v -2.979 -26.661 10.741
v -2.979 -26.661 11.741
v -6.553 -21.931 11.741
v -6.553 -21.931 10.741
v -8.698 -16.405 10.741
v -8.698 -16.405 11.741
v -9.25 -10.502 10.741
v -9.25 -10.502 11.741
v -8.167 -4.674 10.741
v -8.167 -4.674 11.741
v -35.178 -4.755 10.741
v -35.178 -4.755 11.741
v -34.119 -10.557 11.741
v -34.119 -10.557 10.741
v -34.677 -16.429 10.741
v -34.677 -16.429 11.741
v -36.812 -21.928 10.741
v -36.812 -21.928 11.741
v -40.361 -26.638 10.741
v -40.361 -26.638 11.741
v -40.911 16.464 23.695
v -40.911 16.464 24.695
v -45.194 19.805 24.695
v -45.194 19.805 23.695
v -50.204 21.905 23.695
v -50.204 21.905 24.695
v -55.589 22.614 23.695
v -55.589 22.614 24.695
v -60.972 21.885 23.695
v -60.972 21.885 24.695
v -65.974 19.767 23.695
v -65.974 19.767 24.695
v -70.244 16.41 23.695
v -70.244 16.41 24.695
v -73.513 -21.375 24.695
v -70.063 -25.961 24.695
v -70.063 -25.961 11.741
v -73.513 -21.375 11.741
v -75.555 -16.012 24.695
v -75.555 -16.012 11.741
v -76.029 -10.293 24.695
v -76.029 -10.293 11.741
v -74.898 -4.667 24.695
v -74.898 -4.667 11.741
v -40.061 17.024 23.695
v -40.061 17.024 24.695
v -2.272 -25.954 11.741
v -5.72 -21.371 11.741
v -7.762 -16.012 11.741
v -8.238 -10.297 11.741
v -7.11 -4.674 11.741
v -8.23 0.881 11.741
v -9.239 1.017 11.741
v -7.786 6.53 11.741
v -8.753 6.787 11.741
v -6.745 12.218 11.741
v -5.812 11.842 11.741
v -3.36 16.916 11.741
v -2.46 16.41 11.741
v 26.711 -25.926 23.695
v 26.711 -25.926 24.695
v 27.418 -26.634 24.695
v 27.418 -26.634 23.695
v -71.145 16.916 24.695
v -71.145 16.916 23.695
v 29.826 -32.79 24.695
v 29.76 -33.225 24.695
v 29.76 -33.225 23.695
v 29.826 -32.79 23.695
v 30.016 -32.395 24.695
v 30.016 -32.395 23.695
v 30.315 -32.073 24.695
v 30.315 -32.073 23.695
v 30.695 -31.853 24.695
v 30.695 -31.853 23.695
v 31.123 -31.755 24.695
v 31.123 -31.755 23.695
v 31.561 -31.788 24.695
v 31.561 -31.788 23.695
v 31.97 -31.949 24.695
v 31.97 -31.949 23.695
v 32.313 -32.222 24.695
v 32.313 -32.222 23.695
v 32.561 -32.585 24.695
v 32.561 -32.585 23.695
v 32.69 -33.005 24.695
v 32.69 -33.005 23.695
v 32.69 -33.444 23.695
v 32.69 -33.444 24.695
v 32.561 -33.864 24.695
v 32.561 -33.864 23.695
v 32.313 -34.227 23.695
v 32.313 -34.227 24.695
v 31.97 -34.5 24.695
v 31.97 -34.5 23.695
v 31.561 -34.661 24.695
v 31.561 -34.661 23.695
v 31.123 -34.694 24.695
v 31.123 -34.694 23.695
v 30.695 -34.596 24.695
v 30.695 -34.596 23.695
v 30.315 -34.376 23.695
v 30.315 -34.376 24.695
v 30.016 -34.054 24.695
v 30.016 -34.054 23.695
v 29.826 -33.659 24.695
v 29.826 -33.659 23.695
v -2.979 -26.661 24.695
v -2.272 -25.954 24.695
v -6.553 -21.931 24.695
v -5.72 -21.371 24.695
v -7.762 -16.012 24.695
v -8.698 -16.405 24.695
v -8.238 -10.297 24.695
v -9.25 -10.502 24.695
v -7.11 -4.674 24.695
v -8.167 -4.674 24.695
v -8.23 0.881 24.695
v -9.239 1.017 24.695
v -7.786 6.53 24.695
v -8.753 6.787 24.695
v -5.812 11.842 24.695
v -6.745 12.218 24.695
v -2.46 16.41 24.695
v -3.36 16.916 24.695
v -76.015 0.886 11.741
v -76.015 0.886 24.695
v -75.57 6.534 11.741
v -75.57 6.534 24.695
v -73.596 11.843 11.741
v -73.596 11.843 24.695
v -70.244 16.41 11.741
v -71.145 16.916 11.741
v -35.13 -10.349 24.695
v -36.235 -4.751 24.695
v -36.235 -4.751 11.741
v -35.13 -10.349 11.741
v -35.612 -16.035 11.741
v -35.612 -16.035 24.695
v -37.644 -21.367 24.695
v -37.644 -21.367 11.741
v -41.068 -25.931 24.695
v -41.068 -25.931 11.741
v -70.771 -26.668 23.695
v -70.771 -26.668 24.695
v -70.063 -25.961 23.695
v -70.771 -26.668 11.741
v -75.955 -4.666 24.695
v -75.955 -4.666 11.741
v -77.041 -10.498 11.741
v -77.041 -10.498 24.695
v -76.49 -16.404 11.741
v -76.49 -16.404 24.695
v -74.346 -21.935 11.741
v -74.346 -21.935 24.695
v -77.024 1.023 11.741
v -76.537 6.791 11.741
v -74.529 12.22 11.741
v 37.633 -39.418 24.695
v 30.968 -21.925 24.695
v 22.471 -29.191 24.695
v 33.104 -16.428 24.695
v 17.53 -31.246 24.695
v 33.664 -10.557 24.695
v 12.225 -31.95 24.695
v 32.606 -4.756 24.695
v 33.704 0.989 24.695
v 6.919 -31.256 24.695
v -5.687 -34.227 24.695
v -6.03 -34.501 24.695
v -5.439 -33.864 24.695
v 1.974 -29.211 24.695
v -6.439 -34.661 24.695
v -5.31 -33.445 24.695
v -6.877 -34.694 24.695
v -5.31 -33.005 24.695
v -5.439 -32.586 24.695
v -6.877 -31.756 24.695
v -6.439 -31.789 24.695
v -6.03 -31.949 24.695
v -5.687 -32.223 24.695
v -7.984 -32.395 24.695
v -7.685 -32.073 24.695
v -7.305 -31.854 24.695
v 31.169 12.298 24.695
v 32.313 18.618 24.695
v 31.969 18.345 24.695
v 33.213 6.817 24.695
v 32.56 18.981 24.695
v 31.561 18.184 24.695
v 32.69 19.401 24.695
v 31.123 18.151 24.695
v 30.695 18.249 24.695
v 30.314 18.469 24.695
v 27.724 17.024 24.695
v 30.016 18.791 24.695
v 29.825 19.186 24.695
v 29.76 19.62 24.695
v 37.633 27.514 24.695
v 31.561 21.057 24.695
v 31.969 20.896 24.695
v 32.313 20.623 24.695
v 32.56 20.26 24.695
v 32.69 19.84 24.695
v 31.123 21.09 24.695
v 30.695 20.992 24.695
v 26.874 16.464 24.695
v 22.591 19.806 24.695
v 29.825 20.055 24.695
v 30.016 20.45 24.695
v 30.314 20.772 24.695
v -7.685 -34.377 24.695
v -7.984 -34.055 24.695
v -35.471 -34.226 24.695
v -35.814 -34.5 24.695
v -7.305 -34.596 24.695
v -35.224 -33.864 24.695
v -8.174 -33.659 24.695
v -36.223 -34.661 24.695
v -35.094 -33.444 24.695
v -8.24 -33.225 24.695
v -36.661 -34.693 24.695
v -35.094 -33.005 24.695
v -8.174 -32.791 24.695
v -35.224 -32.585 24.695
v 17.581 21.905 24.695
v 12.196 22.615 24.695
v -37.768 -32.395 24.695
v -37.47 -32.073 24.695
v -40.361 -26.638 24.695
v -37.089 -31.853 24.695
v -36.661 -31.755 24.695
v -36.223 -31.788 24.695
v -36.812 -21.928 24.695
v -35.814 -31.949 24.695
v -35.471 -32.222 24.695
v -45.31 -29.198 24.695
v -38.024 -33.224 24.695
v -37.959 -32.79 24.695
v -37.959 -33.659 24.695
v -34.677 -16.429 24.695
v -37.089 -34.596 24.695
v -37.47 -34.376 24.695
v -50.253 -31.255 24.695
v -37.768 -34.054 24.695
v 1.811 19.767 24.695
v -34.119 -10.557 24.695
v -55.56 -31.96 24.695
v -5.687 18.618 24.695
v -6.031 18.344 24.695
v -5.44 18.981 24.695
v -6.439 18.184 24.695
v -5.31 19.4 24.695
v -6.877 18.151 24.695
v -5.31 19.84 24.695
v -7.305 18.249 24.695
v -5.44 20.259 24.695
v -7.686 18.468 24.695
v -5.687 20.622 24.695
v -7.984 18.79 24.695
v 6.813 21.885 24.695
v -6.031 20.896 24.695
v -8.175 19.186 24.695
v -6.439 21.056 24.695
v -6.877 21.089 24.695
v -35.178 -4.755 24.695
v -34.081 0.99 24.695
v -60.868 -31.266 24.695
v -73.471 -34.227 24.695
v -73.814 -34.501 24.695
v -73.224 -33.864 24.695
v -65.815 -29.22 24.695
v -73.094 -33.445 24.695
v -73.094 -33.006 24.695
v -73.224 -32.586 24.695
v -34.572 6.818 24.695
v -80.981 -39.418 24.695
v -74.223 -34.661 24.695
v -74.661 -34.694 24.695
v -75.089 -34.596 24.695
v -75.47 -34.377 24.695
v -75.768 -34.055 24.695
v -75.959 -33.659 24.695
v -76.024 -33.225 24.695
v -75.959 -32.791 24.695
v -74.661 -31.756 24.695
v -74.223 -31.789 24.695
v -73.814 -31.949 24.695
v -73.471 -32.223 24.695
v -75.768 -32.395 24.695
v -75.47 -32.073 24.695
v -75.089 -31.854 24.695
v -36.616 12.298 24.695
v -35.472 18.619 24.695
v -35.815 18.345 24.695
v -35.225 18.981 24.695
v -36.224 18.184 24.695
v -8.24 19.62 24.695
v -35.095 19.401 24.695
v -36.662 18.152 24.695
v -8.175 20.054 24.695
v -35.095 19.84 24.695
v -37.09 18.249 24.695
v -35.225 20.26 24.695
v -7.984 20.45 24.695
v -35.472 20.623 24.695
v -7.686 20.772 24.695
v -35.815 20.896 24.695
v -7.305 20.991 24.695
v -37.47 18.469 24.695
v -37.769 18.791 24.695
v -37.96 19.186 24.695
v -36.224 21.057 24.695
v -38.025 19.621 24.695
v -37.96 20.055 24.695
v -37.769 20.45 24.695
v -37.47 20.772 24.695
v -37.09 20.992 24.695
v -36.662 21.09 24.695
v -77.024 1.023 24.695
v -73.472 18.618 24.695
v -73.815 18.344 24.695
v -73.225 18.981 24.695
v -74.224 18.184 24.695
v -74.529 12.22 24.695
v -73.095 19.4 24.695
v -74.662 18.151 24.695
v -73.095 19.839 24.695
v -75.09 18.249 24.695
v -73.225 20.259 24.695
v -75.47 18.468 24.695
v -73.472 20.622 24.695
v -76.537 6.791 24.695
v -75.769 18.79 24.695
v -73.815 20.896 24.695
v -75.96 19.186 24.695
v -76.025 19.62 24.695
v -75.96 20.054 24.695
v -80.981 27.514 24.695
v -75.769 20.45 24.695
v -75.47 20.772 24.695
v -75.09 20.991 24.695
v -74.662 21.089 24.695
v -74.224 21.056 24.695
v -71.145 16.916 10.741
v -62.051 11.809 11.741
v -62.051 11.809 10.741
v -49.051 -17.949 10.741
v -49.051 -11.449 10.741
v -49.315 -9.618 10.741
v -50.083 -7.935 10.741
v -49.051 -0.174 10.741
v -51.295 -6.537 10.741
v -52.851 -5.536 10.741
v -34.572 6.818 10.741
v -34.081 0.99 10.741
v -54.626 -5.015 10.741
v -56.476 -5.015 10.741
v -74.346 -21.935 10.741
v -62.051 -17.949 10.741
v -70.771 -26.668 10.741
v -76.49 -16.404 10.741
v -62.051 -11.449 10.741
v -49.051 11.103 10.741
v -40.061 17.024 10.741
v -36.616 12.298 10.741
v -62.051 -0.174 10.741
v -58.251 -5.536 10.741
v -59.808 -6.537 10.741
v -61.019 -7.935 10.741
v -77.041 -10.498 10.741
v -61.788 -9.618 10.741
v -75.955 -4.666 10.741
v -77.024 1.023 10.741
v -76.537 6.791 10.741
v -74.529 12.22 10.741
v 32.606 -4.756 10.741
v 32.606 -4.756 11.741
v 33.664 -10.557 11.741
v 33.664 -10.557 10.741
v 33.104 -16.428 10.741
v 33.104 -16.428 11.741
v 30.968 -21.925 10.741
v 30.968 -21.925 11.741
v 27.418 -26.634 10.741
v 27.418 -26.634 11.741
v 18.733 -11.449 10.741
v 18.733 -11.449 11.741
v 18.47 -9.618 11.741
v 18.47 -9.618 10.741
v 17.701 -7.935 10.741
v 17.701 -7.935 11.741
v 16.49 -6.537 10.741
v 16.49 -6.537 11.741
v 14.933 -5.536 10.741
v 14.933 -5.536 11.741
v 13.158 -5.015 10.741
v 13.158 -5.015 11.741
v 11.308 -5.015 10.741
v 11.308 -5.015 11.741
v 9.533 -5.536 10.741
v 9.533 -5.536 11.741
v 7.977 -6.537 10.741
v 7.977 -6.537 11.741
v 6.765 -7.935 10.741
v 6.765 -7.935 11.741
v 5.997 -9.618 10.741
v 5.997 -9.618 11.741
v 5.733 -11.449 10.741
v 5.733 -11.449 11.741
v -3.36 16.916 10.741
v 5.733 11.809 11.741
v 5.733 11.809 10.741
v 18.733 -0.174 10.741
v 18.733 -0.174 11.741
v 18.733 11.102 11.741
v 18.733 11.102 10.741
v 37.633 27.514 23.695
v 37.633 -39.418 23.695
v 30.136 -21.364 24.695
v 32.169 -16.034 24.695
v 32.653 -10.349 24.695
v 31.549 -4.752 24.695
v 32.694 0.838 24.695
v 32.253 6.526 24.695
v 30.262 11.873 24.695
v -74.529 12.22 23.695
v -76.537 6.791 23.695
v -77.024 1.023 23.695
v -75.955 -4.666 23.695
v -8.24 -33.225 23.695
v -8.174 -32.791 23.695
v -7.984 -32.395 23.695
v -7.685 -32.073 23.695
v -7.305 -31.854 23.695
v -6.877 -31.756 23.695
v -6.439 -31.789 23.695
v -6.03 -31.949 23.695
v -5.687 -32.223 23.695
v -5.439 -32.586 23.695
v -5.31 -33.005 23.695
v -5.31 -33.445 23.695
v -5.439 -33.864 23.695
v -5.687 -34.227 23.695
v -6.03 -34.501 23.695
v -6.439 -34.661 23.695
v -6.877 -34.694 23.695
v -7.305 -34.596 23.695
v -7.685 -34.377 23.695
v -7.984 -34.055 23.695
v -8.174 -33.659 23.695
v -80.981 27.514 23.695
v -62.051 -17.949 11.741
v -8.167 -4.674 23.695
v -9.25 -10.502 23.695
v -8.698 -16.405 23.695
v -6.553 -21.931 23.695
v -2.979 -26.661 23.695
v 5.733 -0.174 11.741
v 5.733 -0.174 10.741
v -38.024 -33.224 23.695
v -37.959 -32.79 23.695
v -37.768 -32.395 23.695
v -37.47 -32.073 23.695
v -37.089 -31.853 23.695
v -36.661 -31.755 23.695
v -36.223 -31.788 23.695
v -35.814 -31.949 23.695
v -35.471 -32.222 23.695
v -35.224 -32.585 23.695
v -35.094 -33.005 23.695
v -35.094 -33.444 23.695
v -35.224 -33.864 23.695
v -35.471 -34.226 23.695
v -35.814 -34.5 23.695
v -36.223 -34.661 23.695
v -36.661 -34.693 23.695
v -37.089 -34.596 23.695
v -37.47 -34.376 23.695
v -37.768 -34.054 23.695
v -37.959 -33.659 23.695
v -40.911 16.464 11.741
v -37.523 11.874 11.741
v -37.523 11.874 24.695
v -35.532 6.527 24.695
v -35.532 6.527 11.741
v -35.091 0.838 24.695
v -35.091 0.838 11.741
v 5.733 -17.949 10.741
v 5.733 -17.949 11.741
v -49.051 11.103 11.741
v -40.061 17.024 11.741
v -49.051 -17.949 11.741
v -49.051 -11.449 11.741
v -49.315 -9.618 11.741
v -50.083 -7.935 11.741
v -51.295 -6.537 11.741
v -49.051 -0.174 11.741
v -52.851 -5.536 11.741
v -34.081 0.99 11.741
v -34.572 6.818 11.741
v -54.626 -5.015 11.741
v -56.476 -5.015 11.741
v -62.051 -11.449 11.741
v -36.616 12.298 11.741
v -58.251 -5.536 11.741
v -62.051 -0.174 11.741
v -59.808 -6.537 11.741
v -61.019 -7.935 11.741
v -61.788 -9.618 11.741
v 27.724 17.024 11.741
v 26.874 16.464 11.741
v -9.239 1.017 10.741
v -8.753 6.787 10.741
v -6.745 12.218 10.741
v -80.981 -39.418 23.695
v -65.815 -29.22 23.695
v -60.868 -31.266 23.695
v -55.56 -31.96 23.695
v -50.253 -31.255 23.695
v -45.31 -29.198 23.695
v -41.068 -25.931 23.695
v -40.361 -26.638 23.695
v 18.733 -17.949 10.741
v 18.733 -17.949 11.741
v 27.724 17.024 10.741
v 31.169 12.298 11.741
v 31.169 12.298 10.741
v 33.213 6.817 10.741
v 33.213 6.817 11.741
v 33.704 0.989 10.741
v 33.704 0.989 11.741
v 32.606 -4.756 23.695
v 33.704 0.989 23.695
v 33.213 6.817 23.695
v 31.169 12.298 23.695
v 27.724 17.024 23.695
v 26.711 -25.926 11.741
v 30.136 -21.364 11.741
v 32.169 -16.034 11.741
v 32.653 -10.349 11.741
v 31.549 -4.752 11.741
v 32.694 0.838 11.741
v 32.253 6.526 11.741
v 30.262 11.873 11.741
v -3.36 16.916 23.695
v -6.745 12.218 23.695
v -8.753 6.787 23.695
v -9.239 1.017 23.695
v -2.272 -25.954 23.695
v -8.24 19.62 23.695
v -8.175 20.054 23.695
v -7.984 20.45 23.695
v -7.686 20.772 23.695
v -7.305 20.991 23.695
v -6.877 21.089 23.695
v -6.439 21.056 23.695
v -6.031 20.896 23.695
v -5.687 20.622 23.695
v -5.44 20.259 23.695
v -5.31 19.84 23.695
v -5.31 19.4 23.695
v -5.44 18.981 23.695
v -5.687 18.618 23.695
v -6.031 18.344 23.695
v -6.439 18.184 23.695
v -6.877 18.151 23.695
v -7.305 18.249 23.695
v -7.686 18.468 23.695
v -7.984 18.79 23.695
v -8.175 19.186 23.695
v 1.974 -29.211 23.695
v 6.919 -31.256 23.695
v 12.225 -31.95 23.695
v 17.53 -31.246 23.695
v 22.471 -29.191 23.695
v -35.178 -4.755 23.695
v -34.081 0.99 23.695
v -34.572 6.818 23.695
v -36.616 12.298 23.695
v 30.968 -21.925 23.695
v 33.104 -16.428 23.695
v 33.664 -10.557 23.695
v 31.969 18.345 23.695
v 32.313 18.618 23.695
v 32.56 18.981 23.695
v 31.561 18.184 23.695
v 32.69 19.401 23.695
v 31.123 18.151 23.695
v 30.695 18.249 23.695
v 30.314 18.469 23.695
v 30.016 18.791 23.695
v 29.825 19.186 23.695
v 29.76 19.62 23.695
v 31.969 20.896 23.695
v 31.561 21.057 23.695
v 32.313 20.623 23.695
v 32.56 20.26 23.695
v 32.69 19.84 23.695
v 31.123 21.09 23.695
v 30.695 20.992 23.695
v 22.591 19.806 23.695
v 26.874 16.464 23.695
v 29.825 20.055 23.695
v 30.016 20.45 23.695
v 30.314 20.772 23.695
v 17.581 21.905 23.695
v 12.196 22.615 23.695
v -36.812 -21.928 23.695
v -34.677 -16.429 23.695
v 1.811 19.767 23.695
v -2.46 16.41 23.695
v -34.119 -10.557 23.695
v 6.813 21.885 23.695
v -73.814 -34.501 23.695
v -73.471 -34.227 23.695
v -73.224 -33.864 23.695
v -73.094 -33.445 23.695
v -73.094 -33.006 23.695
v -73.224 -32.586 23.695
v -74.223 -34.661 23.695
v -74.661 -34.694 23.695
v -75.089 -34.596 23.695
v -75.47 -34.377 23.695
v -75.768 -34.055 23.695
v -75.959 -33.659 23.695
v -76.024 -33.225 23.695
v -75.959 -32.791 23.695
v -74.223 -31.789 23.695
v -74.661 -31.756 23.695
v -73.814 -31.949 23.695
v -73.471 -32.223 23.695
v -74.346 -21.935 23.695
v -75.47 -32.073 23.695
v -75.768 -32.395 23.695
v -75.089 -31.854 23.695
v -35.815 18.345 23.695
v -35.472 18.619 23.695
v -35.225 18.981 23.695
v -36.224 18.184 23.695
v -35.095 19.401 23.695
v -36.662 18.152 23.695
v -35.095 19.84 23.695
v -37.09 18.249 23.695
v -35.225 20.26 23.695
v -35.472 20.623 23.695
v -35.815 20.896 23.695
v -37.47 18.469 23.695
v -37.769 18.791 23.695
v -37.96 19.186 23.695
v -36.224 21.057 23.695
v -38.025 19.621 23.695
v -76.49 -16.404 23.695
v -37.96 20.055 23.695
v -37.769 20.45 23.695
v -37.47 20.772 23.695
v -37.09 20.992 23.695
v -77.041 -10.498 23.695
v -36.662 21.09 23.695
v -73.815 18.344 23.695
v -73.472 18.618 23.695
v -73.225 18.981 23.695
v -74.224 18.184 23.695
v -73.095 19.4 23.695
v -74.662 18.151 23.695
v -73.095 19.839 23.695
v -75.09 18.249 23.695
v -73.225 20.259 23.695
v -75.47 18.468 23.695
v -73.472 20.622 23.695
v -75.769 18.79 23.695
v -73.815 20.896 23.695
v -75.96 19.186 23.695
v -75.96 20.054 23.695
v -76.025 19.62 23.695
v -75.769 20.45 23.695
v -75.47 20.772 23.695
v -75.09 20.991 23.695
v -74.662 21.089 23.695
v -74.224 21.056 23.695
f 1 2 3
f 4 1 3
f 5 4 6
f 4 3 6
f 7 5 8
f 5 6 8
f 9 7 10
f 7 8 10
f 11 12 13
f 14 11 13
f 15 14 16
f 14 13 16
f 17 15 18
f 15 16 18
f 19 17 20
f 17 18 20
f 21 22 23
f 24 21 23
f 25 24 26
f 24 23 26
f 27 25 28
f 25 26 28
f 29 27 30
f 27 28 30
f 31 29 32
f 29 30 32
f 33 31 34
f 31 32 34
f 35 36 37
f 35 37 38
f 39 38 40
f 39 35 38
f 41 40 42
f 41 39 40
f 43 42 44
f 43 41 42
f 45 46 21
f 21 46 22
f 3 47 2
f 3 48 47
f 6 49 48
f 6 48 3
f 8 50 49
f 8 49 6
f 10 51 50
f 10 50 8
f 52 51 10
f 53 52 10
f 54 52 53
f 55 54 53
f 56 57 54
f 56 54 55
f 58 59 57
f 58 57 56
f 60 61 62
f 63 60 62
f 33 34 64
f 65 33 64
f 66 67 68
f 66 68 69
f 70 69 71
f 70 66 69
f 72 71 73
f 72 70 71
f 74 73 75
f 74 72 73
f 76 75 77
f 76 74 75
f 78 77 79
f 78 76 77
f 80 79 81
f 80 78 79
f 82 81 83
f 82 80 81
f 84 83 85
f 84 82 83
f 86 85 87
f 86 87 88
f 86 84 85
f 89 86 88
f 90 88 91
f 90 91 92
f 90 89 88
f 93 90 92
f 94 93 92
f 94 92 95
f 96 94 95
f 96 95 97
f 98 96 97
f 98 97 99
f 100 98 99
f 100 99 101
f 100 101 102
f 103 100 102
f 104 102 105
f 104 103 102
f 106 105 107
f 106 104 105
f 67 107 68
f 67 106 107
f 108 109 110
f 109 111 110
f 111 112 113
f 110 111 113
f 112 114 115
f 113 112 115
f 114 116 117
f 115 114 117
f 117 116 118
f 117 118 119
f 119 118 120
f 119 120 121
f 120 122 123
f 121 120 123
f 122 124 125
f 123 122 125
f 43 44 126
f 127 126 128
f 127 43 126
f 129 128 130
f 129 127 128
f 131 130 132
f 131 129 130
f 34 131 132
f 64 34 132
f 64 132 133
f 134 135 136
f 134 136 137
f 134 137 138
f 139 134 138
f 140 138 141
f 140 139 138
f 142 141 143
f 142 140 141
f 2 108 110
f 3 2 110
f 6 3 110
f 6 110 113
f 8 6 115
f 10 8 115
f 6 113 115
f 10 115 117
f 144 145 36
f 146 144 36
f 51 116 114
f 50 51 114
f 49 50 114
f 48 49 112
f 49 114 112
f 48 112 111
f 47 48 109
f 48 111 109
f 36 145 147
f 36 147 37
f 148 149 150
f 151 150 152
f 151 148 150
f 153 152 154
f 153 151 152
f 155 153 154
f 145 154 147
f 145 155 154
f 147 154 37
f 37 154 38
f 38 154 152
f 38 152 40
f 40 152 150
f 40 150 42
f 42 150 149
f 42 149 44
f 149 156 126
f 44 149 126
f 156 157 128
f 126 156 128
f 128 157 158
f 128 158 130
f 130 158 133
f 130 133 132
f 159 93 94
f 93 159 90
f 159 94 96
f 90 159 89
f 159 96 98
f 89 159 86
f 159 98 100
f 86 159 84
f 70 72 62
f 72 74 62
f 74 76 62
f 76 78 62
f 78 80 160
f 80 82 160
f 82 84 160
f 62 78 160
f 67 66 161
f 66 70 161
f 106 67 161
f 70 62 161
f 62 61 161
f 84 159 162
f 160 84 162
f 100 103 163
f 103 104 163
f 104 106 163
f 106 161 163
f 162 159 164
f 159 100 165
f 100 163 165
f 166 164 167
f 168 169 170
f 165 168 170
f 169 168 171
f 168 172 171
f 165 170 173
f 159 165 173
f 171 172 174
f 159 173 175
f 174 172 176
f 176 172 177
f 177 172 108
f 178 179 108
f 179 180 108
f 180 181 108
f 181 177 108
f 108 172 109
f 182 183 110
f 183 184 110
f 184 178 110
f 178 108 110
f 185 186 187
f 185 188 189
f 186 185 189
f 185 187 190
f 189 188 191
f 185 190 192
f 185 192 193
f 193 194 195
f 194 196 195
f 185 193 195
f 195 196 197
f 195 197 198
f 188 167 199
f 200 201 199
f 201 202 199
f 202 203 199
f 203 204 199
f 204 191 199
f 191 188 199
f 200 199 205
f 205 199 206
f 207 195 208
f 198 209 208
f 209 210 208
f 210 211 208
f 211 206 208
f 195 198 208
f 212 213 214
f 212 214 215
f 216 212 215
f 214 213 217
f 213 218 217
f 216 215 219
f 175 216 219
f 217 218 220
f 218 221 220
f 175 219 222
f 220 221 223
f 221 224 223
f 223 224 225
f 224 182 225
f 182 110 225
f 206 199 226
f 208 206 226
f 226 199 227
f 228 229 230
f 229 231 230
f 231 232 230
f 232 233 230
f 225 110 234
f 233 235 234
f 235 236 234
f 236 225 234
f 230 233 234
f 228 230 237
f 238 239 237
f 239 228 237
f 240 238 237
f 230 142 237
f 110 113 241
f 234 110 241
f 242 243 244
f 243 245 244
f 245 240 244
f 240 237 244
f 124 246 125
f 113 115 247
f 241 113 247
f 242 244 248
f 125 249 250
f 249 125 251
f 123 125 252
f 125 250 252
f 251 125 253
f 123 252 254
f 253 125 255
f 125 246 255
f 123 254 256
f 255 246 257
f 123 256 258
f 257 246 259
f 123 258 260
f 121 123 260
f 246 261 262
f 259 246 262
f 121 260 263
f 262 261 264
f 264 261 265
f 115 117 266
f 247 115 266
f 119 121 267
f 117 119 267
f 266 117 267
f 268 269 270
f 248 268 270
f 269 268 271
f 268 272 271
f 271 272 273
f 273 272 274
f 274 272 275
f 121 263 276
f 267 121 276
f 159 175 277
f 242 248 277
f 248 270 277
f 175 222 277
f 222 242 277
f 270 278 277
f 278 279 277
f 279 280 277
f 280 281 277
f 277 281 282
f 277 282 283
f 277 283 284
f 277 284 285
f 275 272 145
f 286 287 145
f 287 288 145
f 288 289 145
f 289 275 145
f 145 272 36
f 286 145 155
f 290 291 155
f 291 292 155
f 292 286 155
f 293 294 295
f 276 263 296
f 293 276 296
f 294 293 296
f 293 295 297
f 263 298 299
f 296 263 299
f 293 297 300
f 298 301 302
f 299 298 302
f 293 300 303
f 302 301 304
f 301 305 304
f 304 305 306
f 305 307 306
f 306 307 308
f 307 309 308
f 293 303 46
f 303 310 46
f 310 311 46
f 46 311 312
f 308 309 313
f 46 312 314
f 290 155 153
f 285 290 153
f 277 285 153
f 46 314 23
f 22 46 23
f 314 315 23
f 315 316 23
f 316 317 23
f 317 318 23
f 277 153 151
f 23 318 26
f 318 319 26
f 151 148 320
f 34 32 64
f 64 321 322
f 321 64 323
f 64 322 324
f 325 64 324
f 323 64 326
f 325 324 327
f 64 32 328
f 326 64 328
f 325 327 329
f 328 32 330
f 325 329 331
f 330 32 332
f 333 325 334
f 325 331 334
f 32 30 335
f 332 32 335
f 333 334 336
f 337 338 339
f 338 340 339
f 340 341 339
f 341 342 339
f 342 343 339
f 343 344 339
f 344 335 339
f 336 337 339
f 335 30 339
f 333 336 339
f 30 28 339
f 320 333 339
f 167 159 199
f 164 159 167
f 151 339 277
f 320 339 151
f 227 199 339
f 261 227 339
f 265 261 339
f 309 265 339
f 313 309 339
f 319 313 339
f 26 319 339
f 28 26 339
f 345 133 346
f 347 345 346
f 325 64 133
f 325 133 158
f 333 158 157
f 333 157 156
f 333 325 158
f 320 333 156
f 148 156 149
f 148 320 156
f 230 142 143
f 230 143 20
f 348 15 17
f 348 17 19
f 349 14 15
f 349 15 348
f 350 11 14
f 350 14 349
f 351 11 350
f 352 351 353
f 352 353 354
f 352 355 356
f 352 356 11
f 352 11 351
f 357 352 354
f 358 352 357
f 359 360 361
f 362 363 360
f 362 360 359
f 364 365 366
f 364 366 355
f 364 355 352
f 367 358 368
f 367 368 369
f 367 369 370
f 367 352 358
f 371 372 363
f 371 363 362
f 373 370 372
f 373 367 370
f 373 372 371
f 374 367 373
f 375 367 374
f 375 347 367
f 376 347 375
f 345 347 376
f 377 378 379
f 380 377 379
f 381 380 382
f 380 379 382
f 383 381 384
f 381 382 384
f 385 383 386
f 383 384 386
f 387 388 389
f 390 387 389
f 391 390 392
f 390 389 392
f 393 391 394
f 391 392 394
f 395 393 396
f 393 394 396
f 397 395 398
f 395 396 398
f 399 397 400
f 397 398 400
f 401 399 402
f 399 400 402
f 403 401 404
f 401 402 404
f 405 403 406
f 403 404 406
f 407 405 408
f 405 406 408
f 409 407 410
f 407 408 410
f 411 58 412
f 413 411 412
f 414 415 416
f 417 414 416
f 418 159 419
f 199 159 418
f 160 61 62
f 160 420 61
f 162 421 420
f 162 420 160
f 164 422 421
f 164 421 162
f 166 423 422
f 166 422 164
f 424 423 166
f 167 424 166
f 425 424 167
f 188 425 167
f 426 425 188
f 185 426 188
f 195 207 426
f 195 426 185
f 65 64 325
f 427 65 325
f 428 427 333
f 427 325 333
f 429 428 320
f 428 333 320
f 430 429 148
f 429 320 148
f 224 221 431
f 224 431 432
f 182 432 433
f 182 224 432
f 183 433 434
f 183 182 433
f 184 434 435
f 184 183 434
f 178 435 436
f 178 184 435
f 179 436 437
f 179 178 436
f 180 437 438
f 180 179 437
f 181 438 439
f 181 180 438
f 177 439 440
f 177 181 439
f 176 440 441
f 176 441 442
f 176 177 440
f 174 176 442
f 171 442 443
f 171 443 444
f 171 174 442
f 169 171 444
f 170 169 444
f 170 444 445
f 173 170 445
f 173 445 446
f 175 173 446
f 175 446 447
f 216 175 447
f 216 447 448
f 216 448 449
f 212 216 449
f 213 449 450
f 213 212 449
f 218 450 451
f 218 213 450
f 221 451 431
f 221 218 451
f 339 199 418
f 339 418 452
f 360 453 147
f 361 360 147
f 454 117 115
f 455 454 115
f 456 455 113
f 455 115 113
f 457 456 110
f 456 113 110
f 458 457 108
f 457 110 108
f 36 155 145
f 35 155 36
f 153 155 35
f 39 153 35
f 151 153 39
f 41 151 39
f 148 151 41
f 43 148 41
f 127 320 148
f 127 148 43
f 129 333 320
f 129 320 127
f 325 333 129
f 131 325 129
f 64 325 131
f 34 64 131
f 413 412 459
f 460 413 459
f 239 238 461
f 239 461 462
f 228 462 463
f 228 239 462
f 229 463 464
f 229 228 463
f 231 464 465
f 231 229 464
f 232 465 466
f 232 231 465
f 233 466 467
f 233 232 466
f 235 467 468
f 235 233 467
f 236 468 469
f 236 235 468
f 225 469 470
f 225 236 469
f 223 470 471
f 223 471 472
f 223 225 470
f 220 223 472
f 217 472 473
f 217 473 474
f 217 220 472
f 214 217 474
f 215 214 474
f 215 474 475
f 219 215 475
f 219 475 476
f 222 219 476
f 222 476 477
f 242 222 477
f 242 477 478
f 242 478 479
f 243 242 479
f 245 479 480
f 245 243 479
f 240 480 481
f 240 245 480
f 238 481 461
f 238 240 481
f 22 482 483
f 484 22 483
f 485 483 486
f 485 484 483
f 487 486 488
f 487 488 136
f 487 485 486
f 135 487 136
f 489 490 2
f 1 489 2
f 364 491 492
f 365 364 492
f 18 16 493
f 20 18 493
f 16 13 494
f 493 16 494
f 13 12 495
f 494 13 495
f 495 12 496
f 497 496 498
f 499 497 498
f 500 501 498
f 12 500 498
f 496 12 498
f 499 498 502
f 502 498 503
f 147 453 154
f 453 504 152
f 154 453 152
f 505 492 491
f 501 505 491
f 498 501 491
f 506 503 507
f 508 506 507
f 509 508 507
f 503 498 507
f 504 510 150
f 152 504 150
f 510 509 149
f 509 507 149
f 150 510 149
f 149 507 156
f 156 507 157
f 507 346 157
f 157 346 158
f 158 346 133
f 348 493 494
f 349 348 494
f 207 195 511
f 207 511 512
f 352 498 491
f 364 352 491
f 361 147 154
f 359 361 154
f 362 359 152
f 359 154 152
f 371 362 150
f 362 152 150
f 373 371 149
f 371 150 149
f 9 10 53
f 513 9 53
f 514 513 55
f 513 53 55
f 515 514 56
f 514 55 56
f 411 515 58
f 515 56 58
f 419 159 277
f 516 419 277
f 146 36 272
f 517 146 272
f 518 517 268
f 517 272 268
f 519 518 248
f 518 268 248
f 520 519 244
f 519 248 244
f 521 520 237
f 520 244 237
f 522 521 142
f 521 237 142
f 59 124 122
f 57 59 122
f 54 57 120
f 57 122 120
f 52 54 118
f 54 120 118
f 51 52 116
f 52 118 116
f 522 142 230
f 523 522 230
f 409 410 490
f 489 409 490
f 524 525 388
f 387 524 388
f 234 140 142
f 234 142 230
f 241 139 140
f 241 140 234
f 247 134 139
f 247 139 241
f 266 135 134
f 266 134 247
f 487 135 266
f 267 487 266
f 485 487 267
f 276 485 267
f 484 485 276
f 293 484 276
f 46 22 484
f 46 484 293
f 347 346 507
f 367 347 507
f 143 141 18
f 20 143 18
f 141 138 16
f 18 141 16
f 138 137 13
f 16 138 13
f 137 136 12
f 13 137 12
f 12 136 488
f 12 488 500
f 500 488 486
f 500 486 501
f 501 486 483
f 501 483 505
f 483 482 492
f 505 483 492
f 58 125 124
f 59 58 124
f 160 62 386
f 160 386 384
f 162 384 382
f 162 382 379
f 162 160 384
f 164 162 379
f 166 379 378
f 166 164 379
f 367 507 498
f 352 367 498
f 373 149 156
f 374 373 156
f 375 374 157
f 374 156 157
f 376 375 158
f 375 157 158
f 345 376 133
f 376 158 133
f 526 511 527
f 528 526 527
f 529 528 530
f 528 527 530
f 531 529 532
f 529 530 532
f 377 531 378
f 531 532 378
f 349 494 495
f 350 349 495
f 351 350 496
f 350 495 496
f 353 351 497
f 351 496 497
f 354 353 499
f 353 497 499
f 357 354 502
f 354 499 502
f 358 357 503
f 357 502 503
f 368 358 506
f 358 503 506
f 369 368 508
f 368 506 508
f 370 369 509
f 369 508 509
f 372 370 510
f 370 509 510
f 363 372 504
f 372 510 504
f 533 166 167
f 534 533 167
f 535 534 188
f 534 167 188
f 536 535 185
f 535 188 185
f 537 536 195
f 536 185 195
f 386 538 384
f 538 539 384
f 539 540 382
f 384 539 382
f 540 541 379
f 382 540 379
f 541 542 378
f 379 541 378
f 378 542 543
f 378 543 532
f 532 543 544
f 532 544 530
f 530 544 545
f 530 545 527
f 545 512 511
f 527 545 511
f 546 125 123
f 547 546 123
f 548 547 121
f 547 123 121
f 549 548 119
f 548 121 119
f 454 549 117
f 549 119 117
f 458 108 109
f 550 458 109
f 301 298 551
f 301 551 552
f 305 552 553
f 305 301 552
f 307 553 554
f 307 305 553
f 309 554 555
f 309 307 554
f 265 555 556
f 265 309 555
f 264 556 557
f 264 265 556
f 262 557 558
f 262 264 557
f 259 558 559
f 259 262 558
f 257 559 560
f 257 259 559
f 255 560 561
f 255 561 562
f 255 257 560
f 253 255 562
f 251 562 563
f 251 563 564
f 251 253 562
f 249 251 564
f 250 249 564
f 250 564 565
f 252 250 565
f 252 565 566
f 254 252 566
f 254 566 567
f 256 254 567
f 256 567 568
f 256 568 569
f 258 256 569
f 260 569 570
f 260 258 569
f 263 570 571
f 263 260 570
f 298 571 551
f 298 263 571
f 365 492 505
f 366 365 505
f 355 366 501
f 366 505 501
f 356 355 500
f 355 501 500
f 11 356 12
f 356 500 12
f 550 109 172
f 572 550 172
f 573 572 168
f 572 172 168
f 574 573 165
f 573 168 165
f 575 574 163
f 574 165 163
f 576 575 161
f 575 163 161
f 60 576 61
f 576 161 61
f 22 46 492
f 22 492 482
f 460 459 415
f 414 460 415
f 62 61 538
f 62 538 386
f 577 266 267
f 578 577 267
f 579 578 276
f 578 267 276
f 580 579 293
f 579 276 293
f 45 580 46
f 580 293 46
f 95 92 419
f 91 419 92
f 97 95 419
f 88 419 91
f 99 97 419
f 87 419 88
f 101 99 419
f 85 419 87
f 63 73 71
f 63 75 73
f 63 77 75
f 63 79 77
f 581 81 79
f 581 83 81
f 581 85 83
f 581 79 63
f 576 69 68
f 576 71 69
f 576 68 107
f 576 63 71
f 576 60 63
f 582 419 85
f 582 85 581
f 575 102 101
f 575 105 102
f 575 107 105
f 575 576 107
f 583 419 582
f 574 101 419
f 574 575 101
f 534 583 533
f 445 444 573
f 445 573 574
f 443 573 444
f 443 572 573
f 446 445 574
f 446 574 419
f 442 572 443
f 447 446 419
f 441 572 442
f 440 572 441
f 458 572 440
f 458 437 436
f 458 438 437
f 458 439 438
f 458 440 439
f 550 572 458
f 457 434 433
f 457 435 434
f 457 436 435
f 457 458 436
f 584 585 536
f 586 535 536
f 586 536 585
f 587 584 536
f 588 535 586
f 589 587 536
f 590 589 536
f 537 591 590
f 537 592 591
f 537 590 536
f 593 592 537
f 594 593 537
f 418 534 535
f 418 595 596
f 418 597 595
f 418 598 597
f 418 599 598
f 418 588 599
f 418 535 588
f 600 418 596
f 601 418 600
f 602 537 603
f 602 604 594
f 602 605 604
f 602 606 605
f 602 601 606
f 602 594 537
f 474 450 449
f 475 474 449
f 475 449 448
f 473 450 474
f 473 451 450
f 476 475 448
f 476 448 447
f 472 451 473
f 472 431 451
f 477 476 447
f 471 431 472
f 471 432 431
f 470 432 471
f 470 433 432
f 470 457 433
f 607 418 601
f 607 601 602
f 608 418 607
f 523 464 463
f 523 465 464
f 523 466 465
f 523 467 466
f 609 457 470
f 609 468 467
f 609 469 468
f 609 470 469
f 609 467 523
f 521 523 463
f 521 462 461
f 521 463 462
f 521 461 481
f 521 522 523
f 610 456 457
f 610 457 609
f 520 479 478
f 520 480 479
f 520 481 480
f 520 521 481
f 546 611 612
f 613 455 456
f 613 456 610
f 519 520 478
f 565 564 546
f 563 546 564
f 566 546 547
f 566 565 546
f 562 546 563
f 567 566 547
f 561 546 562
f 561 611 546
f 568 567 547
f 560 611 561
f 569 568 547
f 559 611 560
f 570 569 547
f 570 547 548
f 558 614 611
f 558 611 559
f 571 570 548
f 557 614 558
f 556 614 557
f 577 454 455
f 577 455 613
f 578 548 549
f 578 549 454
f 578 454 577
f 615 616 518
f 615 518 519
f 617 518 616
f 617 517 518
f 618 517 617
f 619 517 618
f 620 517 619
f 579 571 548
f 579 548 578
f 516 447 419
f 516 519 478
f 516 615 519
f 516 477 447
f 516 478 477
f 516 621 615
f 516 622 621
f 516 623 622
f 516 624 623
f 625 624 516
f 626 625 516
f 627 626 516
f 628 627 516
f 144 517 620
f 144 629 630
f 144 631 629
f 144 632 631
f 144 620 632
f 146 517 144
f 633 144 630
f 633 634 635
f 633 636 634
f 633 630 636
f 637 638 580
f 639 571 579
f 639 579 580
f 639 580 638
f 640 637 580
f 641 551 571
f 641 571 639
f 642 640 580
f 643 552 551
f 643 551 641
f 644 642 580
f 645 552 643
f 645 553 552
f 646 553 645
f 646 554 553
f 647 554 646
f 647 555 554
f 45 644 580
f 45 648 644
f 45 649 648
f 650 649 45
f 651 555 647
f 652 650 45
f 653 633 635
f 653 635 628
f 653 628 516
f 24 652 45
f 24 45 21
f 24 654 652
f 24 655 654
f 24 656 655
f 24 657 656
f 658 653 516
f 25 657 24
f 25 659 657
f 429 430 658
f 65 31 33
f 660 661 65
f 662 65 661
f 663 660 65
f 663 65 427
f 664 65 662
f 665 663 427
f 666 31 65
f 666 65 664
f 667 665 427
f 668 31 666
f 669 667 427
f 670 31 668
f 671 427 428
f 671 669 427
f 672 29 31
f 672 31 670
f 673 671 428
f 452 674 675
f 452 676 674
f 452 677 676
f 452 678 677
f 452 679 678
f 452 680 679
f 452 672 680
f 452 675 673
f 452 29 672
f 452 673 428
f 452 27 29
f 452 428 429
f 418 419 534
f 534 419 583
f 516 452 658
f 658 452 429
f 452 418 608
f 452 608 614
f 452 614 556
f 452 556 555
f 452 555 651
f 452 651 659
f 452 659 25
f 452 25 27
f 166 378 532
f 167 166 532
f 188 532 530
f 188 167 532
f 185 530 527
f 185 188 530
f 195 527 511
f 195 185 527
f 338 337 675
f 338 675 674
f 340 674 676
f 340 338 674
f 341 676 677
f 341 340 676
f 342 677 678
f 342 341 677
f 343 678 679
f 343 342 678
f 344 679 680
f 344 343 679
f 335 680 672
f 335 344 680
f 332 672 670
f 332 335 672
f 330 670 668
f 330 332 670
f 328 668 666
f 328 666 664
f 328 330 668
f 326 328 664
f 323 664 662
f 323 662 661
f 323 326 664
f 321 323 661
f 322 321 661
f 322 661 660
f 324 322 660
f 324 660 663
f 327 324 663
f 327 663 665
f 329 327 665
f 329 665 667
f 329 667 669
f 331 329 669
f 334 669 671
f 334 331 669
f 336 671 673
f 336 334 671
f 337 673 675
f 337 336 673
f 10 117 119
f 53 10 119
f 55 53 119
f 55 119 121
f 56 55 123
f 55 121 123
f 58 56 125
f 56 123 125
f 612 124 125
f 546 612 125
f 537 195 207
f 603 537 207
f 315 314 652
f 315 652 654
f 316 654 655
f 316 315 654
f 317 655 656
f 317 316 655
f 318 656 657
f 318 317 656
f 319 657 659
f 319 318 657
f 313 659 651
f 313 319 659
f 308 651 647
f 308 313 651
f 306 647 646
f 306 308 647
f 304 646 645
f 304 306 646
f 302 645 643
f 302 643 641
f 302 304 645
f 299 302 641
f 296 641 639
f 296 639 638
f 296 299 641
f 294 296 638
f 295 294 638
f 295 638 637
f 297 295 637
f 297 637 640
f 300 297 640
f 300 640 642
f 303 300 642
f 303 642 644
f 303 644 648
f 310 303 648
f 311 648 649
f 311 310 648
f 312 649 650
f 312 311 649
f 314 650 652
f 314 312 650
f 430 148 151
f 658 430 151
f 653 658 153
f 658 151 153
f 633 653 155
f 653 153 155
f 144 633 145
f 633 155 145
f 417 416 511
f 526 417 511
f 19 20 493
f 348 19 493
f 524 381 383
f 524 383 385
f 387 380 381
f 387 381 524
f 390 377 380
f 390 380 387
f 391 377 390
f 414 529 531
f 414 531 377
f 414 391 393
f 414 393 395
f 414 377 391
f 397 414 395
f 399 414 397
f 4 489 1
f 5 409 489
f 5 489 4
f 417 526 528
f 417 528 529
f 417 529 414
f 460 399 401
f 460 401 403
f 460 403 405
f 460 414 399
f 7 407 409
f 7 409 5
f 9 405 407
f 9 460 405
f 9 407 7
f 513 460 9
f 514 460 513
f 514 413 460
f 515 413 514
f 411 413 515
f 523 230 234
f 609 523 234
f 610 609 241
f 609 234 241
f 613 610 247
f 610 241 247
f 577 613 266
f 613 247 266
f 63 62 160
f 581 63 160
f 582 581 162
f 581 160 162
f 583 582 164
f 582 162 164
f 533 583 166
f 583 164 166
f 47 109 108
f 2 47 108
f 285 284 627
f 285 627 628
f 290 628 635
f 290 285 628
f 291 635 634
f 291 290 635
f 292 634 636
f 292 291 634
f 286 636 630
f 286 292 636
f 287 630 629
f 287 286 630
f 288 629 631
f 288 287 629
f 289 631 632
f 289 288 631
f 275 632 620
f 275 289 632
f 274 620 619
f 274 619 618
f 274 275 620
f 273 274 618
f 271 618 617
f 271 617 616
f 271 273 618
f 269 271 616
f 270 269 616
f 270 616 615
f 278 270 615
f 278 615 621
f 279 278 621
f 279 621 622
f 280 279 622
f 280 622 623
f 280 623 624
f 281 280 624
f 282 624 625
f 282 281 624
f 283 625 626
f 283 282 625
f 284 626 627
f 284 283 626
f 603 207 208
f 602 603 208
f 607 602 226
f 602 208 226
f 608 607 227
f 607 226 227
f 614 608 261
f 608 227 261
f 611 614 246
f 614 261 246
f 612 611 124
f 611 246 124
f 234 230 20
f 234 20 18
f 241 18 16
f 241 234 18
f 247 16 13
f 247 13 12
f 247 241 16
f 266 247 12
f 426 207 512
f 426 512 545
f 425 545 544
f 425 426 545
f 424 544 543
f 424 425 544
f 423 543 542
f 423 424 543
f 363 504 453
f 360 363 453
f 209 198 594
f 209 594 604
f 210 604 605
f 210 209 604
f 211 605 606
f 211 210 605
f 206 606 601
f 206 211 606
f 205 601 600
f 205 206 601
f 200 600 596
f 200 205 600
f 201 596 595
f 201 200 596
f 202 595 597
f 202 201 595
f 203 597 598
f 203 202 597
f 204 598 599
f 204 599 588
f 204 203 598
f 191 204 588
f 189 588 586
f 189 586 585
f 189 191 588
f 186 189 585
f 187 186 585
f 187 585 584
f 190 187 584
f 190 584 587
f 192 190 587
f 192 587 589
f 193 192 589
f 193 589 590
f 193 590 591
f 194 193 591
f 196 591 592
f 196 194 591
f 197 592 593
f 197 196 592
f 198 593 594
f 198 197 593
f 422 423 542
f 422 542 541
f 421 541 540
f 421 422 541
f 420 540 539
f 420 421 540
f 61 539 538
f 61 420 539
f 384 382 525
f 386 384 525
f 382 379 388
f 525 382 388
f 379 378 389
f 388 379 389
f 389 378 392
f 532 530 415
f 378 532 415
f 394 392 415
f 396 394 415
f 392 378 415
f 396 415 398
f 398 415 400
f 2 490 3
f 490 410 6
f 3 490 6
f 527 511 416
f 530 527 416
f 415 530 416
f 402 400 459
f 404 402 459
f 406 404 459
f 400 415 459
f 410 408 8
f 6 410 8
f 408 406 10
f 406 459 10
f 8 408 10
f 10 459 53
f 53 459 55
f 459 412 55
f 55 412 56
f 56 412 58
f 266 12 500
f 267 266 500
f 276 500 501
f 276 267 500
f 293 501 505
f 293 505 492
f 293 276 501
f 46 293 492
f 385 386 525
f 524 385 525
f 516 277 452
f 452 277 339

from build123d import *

# Parameters (mm, degrees)
BOSS_EXTRUDE1_DEPTH   = 12.954
BOSS_EXTRUDE1_2_DEPTH = 12.954
BOSS_EXTRUDE1_3_DEPTH = 12.954
BOSS_EXTRUDE1_4_DEPTH = 12.954
SKETCH1_5_W           = 118.614322008
SKETCH1_5_H           = 66.932160629
SKETCH1_5_R           = 1.4732
BOSS_EXTRUDE7_DEPTH   = 1
BOSS_EXTRUDE8_DEPTH   = 1
BOSS_EXTRUDE8_2_DEPTH = 1


with BuildPart() as part:
    # Sketch1 → Boss-Extrude1 (new body)
    with BuildSketch(Plane(origin=(0, 0, 24.694917193), x_dir=(-1, 0, 0), z_dir=(0, 0, -1))):
        with BuildLine():
            Line((-26.711239732, -25.926461717), (-27.418356705, -26.633560376))
            ThreePointArc((-27.418356705, -26.633560376), (-33.103898465, -16.427883163), (-32.606315955, -4.755966263))
            ThreePointArc((-32.606315955, -4.755966263), (-33.212872936, 6.817494073), (-27.723683277, 17.024437416))
            Line((-27.723683277, 17.024437416), (-26.873543442, 16.464449956))
            ThreePointArc((-26.873543442, 16.464449956), (-32.253152748, 6.526489502), (-31.549394168, -4.75216193))
            ThreePointArc((-31.549394168, -4.75216193), (-32.168953824, -16.033615513), (-26.711239732, -25.926461717))
        make_face()
    extrude(amount=BOSS_EXTRUDE1_DEPTH)


with BuildPart() as body_2:
    # Sketch1 → Boss-Extrude1 2 (new body)
    with BuildSketch(Plane(origin=(0, 0, 24.694917193), x_dir=(-1, 0, 0), z_dir=(0, 0, -1))):
        with BuildLine():
            Line((2.271842608, -25.95414115), (2.978940339, -26.661256992))
            ThreePointArc((2.978940339, -26.661256992), (8.697616612, -16.404714138), (8.167257761, -4.673616614))
            ThreePointArc((8.167257761, -4.673616614), (8.753052566, 6.786952267), (3.360296242, 16.916412955))
            Line((3.360296242, 16.916412955), (2.459590829, 16.410495208))
            ThreePointArc((2.459590829, 16.410495208), (7.785713157, 6.530099053), (7.11032923, -4.674081586))
            ThreePointArc((7.11032923, -4.674081586), (7.76203635, -16.012359065), (2.271842608, -25.95414115))
        make_face()
    extrude(amount=BOSS_EXTRUDE1_2_DEPTH)


with BuildPart() as body_3:
    # Sketch1 → Boss-Extrude1 3 (new body)
    with BuildSketch(Plane(origin=(0, 0, 24.694917193), x_dir=(-1, 0, 0), z_dir=(0, 0, -1))):
        with BuildLine():
            Line((40.061312196, 17.024347064), (40.911450673, 16.464353309))
            ThreePointArc((40.911450673, 16.464353309), (35.531738914, 6.526878162), (36.234922811, -4.751430369))
            ThreePointArc((36.234922811, -4.751430369), (35.612355655, -16.034911484), (41.068452193, -25.931150492))
            Line((41.068452193, -25.931150492), (40.361330704, -26.638245326))
            ThreePointArc((40.361330704, -26.638245326), (34.677350547, -16.429116332), (35.177966741, -4.755071247))
            ThreePointArc((35.177966741, -4.755071247), (34.572040238, 6.81796561), (40.061312196, 17.024347064))
        make_face()
    extrude(amount=BOSS_EXTRUDE1_3_DEPTH)


with BuildPart() as body_4:
    # Sketch1 → Boss-Extrude1 4 (new body)
    with BuildSketch(Plane(origin=(0, 0, 24.694917193), x_dir=(-1, 0, 0), z_dir=(0, 0, -1))):
        with BuildLine():
            Line((70.244185819, 16.410340589), (71.144898793, 16.916255594))
            ThreePointArc((71.144898793, 16.916255594), (76.536957488, 6.790628874), (75.954602378, -4.666398488))
            ThreePointArc((75.954602378, -4.666398488), (76.490482856, -16.40442492), (70.770513911, -26.668458613))
            Line((70.770513911, -26.668458613), (70.063420356, -25.961338606))
            ThreePointArc((70.063420356, -25.961338606), (75.554797046, -16.01227522), (74.897640471, -4.667354531))
            ThreePointArc((74.897640471, -4.667354531), (75.569676563, 6.533548794), (70.244185819, 16.410340589))
        make_face()
    extrude(amount=BOSS_EXTRUDE1_4_DEPTH)


with BuildPart() as body_5:
    # Sketch1<5> → Boss-Extrude7 (new body)
    with BuildSketch(Plane(origin=(0, 0, 24.694917193), x_dir=(-1, 0, 0), z_dir=(0, 0, -1))):
        with Locations((21.673839127, -5.951687391)):
            Rectangle(SKETCH1_5_W, SKETCH1_5_H)
        with Locations((-31.233446035, -33.224517796)):
            Circle(SKETCH1_5_R, mode=Mode.SUBTRACT)
        with Locations((6.766553887, -33.225006242)):
            Circle(SKETCH1_5_R, mode=Mode.SUBTRACT)
        with Locations((36.550977194, -33.224405729)):
            Circle(SKETCH1_5_R, mode=Mode.SUBTRACT)
        with Locations((74.550977113, -33.225118305)):
            Circle(SKETCH1_5_R, mode=Mode.SUBTRACT)
        with BuildLine():
            ThreePointArc((2.271842608, -25.95414115), (-12.225437728, -31.949771243), (-26.711239732, -25.926461717))
            Line((-26.711239732, -25.926461717), (-27.418356705, -26.633560376))
            ThreePointArc((-27.418356705, -26.633560376), (-33.103898465, -16.427883163), (-32.606315955, -4.755966263))
            ThreePointArc((-32.606315955, -4.755966263), (-33.212872936, 6.817494073), (-27.723683277, 17.024437416))
            Line((-27.723683277, 17.024437416), (-26.873543442, 16.464449956))
            ThreePointArc((-26.873543442, 16.464449956), (-12.195614215, 22.614607616), (2.459590829, 16.410495208))
            Line((2.459590829, 16.410495208), (3.360296242, 16.916412955))
            ThreePointArc((3.360296242, 16.916412955), (8.753052566, 6.786952267), (8.167257761, -4.673616614))
            ThreePointArc((8.167257761, -4.673616614), (8.697616612, -16.404714138), (2.978940339, -26.661256992))
            Line((2.978940339, -26.661256992), (2.271842608, -25.95414115))
        make_face(mode=Mode.SUBTRACT)
        with Locations((-31.232766774, 19.620482705)):
            Circle(SKETCH1_5_R, mode=Mode.SUBTRACT)
        with Locations((6.767233148, 19.619994259)):
            Circle(SKETCH1_5_R, mode=Mode.SUBTRACT)
        with BuildLine():
            ThreePointArc((35.177966741, -4.755071247), (34.572040238, 6.81796561), (40.061312196, 17.024347064))
            Line((40.061312196, 17.024347064), (40.911450673, 16.464353309))
            ThreePointArc((40.911450673, 16.464353309), (55.589192289, 22.614258134), (70.244185819, 16.410340589))
            Line((70.244185819, 16.410340589), (71.144898793, 16.916255594))
            ThreePointArc((71.144898793, 16.916255594), (76.536957488, 6.790628874), (75.954602378, -4.666398488))
            ThreePointArc((75.954602378, -4.666398488), (76.490482856, -16.40442492), (70.770513911, -26.668458613))
            Line((70.770513911, -26.668458613), (70.063420356, -25.961338606))
            ThreePointArc((70.063420356, -25.961338606), (55.559675255, -31.959805369), (41.068452193, -25.931150492))
            Line((41.068452193, -25.931150492), (40.361330704, -26.638245326))
            ThreePointArc((40.361330704, -26.638245326), (34.677350547, -16.429116332), (35.177966741, -4.755071247))
        make_face(mode=Mode.SUBTRACT)
        with Locations((36.551968143, 19.620594767)):
            Circle(SKETCH1_5_R, mode=Mode.SUBTRACT)
        with Locations((74.551968061, 19.619882191)):
            Circle(SKETCH1_5_R, mode=Mode.SUBTRACT)
    extrude(amount=BOSS_EXTRUDE7_DEPTH)


with BuildPart() as body_6:
    # Sketch4 → Boss-Extrude8 (new body)
    with BuildSketch(Plane(origin=(0, 0, 11.740917193), x_dir=(-1, 0, 0), z_dir=(0, 0, -1))):
        with BuildLine():
            ThreePointArc((35.177966741, -4.755071247), (34.677350547, -16.429116332), (40.361330704, -26.638245326))
            Line((40.361330704, -26.638245326), (49.051264407, -17.948639189))
            Line((49.051264407, -17.948639189), (49.051264407, -11.448944696))
            ThreePointArc((49.051264407, -11.448944696), (55.551264423, -4.948944679), (62.05126444, -11.448944696))
            Line((62.05126444, -11.448944696), (62.05126444, -17.948882965))
            Line((62.05126444, -17.948882965), (70.770513911, -26.668458613))
            ThreePointArc((70.770513911, -26.668458613), (76.490482856, -16.40442492), (75.954602378, -4.666398488))
            ThreePointArc((75.954602378, -4.666398488), (76.536957488, 6.790628874), (71.144898793, 16.916255594))
            Line((71.144898793, 16.916255594), (62.05126444, 11.808517386))
            Line((62.05126444, 11.808517386), (62.05126444, -0.173638647))
            Line((62.05126444, -0.173638647), (49.051264407, -0.173638647))
            Line((49.051264407, -0.173638647), (49.051264407, 11.102585807))
            Line((49.051264407, 11.102585807), (40.061312196, 17.024347064))
            ThreePointArc((40.061312196, 17.024347064), (34.572040238, 6.81796561), (35.177966741, -4.755071247))
        make_face()
    extrude(amount=BOSS_EXTRUDE8_DEPTH)


with BuildPart() as body_7:
    # Sketch4 → Boss-Extrude8 2 (new body)
    with BuildSketch(Plane(origin=(0, 0, 11.740917193), x_dir=(-1, 0, 0), z_dir=(0, 0, -1))):
        with BuildLine():
            ThreePointArc((8.167257761, -4.673616614), (8.753052566, 6.786952267), (3.360296242, 16.916412955))
            Line((3.360296242, 16.916412955), (-5.73302041, 11.808782641))
            Line((-5.73302041, 11.808782641), (-5.73302041, -0.17384409))
            Line((-5.73302041, -0.17384409), (-18.733020444, -0.17367699))
            Line((-18.733020444, -0.17367699), (-18.733020444, 11.102284103))
            Line((-18.733020444, 11.102284103), (-27.723683277, 17.024437416))
            ThreePointArc((-27.723683277, 17.024437416), (-33.212872936, 6.817494073), (-32.606315955, -4.755966263))
            ThreePointArc((-32.606315955, -4.755966263), (-33.103898465, -16.427883163), (-27.418356705, -26.633560376))
            Line((-27.418356705, -26.633560376), (-18.733248921, -17.948677527))
            Line((-18.733248921, -17.948677527), (-18.733248921, -11.448944686))
            ThreePointArc((-18.733248921, -11.448944686), (-12.233248904, -4.948944669), (-5.733248887, -11.448944686))
            Line((-5.733248887, -11.448944686), (-5.733248887, -17.948844627))
            Line((-5.733248887, -17.948844627), (2.978940339, -26.661256992))
            ThreePointArc((2.978940339, -26.661256992), (8.697616612, -16.404714138), (8.167257761, -4.673616614))
        make_face()
    extrude(amount=BOSS_EXTRUDE8_2_DEPTH)


solid = Compound([part.part, body_2.part, body_3.part, body_4.part, body_5.part, body_6.part, body_7.part])
